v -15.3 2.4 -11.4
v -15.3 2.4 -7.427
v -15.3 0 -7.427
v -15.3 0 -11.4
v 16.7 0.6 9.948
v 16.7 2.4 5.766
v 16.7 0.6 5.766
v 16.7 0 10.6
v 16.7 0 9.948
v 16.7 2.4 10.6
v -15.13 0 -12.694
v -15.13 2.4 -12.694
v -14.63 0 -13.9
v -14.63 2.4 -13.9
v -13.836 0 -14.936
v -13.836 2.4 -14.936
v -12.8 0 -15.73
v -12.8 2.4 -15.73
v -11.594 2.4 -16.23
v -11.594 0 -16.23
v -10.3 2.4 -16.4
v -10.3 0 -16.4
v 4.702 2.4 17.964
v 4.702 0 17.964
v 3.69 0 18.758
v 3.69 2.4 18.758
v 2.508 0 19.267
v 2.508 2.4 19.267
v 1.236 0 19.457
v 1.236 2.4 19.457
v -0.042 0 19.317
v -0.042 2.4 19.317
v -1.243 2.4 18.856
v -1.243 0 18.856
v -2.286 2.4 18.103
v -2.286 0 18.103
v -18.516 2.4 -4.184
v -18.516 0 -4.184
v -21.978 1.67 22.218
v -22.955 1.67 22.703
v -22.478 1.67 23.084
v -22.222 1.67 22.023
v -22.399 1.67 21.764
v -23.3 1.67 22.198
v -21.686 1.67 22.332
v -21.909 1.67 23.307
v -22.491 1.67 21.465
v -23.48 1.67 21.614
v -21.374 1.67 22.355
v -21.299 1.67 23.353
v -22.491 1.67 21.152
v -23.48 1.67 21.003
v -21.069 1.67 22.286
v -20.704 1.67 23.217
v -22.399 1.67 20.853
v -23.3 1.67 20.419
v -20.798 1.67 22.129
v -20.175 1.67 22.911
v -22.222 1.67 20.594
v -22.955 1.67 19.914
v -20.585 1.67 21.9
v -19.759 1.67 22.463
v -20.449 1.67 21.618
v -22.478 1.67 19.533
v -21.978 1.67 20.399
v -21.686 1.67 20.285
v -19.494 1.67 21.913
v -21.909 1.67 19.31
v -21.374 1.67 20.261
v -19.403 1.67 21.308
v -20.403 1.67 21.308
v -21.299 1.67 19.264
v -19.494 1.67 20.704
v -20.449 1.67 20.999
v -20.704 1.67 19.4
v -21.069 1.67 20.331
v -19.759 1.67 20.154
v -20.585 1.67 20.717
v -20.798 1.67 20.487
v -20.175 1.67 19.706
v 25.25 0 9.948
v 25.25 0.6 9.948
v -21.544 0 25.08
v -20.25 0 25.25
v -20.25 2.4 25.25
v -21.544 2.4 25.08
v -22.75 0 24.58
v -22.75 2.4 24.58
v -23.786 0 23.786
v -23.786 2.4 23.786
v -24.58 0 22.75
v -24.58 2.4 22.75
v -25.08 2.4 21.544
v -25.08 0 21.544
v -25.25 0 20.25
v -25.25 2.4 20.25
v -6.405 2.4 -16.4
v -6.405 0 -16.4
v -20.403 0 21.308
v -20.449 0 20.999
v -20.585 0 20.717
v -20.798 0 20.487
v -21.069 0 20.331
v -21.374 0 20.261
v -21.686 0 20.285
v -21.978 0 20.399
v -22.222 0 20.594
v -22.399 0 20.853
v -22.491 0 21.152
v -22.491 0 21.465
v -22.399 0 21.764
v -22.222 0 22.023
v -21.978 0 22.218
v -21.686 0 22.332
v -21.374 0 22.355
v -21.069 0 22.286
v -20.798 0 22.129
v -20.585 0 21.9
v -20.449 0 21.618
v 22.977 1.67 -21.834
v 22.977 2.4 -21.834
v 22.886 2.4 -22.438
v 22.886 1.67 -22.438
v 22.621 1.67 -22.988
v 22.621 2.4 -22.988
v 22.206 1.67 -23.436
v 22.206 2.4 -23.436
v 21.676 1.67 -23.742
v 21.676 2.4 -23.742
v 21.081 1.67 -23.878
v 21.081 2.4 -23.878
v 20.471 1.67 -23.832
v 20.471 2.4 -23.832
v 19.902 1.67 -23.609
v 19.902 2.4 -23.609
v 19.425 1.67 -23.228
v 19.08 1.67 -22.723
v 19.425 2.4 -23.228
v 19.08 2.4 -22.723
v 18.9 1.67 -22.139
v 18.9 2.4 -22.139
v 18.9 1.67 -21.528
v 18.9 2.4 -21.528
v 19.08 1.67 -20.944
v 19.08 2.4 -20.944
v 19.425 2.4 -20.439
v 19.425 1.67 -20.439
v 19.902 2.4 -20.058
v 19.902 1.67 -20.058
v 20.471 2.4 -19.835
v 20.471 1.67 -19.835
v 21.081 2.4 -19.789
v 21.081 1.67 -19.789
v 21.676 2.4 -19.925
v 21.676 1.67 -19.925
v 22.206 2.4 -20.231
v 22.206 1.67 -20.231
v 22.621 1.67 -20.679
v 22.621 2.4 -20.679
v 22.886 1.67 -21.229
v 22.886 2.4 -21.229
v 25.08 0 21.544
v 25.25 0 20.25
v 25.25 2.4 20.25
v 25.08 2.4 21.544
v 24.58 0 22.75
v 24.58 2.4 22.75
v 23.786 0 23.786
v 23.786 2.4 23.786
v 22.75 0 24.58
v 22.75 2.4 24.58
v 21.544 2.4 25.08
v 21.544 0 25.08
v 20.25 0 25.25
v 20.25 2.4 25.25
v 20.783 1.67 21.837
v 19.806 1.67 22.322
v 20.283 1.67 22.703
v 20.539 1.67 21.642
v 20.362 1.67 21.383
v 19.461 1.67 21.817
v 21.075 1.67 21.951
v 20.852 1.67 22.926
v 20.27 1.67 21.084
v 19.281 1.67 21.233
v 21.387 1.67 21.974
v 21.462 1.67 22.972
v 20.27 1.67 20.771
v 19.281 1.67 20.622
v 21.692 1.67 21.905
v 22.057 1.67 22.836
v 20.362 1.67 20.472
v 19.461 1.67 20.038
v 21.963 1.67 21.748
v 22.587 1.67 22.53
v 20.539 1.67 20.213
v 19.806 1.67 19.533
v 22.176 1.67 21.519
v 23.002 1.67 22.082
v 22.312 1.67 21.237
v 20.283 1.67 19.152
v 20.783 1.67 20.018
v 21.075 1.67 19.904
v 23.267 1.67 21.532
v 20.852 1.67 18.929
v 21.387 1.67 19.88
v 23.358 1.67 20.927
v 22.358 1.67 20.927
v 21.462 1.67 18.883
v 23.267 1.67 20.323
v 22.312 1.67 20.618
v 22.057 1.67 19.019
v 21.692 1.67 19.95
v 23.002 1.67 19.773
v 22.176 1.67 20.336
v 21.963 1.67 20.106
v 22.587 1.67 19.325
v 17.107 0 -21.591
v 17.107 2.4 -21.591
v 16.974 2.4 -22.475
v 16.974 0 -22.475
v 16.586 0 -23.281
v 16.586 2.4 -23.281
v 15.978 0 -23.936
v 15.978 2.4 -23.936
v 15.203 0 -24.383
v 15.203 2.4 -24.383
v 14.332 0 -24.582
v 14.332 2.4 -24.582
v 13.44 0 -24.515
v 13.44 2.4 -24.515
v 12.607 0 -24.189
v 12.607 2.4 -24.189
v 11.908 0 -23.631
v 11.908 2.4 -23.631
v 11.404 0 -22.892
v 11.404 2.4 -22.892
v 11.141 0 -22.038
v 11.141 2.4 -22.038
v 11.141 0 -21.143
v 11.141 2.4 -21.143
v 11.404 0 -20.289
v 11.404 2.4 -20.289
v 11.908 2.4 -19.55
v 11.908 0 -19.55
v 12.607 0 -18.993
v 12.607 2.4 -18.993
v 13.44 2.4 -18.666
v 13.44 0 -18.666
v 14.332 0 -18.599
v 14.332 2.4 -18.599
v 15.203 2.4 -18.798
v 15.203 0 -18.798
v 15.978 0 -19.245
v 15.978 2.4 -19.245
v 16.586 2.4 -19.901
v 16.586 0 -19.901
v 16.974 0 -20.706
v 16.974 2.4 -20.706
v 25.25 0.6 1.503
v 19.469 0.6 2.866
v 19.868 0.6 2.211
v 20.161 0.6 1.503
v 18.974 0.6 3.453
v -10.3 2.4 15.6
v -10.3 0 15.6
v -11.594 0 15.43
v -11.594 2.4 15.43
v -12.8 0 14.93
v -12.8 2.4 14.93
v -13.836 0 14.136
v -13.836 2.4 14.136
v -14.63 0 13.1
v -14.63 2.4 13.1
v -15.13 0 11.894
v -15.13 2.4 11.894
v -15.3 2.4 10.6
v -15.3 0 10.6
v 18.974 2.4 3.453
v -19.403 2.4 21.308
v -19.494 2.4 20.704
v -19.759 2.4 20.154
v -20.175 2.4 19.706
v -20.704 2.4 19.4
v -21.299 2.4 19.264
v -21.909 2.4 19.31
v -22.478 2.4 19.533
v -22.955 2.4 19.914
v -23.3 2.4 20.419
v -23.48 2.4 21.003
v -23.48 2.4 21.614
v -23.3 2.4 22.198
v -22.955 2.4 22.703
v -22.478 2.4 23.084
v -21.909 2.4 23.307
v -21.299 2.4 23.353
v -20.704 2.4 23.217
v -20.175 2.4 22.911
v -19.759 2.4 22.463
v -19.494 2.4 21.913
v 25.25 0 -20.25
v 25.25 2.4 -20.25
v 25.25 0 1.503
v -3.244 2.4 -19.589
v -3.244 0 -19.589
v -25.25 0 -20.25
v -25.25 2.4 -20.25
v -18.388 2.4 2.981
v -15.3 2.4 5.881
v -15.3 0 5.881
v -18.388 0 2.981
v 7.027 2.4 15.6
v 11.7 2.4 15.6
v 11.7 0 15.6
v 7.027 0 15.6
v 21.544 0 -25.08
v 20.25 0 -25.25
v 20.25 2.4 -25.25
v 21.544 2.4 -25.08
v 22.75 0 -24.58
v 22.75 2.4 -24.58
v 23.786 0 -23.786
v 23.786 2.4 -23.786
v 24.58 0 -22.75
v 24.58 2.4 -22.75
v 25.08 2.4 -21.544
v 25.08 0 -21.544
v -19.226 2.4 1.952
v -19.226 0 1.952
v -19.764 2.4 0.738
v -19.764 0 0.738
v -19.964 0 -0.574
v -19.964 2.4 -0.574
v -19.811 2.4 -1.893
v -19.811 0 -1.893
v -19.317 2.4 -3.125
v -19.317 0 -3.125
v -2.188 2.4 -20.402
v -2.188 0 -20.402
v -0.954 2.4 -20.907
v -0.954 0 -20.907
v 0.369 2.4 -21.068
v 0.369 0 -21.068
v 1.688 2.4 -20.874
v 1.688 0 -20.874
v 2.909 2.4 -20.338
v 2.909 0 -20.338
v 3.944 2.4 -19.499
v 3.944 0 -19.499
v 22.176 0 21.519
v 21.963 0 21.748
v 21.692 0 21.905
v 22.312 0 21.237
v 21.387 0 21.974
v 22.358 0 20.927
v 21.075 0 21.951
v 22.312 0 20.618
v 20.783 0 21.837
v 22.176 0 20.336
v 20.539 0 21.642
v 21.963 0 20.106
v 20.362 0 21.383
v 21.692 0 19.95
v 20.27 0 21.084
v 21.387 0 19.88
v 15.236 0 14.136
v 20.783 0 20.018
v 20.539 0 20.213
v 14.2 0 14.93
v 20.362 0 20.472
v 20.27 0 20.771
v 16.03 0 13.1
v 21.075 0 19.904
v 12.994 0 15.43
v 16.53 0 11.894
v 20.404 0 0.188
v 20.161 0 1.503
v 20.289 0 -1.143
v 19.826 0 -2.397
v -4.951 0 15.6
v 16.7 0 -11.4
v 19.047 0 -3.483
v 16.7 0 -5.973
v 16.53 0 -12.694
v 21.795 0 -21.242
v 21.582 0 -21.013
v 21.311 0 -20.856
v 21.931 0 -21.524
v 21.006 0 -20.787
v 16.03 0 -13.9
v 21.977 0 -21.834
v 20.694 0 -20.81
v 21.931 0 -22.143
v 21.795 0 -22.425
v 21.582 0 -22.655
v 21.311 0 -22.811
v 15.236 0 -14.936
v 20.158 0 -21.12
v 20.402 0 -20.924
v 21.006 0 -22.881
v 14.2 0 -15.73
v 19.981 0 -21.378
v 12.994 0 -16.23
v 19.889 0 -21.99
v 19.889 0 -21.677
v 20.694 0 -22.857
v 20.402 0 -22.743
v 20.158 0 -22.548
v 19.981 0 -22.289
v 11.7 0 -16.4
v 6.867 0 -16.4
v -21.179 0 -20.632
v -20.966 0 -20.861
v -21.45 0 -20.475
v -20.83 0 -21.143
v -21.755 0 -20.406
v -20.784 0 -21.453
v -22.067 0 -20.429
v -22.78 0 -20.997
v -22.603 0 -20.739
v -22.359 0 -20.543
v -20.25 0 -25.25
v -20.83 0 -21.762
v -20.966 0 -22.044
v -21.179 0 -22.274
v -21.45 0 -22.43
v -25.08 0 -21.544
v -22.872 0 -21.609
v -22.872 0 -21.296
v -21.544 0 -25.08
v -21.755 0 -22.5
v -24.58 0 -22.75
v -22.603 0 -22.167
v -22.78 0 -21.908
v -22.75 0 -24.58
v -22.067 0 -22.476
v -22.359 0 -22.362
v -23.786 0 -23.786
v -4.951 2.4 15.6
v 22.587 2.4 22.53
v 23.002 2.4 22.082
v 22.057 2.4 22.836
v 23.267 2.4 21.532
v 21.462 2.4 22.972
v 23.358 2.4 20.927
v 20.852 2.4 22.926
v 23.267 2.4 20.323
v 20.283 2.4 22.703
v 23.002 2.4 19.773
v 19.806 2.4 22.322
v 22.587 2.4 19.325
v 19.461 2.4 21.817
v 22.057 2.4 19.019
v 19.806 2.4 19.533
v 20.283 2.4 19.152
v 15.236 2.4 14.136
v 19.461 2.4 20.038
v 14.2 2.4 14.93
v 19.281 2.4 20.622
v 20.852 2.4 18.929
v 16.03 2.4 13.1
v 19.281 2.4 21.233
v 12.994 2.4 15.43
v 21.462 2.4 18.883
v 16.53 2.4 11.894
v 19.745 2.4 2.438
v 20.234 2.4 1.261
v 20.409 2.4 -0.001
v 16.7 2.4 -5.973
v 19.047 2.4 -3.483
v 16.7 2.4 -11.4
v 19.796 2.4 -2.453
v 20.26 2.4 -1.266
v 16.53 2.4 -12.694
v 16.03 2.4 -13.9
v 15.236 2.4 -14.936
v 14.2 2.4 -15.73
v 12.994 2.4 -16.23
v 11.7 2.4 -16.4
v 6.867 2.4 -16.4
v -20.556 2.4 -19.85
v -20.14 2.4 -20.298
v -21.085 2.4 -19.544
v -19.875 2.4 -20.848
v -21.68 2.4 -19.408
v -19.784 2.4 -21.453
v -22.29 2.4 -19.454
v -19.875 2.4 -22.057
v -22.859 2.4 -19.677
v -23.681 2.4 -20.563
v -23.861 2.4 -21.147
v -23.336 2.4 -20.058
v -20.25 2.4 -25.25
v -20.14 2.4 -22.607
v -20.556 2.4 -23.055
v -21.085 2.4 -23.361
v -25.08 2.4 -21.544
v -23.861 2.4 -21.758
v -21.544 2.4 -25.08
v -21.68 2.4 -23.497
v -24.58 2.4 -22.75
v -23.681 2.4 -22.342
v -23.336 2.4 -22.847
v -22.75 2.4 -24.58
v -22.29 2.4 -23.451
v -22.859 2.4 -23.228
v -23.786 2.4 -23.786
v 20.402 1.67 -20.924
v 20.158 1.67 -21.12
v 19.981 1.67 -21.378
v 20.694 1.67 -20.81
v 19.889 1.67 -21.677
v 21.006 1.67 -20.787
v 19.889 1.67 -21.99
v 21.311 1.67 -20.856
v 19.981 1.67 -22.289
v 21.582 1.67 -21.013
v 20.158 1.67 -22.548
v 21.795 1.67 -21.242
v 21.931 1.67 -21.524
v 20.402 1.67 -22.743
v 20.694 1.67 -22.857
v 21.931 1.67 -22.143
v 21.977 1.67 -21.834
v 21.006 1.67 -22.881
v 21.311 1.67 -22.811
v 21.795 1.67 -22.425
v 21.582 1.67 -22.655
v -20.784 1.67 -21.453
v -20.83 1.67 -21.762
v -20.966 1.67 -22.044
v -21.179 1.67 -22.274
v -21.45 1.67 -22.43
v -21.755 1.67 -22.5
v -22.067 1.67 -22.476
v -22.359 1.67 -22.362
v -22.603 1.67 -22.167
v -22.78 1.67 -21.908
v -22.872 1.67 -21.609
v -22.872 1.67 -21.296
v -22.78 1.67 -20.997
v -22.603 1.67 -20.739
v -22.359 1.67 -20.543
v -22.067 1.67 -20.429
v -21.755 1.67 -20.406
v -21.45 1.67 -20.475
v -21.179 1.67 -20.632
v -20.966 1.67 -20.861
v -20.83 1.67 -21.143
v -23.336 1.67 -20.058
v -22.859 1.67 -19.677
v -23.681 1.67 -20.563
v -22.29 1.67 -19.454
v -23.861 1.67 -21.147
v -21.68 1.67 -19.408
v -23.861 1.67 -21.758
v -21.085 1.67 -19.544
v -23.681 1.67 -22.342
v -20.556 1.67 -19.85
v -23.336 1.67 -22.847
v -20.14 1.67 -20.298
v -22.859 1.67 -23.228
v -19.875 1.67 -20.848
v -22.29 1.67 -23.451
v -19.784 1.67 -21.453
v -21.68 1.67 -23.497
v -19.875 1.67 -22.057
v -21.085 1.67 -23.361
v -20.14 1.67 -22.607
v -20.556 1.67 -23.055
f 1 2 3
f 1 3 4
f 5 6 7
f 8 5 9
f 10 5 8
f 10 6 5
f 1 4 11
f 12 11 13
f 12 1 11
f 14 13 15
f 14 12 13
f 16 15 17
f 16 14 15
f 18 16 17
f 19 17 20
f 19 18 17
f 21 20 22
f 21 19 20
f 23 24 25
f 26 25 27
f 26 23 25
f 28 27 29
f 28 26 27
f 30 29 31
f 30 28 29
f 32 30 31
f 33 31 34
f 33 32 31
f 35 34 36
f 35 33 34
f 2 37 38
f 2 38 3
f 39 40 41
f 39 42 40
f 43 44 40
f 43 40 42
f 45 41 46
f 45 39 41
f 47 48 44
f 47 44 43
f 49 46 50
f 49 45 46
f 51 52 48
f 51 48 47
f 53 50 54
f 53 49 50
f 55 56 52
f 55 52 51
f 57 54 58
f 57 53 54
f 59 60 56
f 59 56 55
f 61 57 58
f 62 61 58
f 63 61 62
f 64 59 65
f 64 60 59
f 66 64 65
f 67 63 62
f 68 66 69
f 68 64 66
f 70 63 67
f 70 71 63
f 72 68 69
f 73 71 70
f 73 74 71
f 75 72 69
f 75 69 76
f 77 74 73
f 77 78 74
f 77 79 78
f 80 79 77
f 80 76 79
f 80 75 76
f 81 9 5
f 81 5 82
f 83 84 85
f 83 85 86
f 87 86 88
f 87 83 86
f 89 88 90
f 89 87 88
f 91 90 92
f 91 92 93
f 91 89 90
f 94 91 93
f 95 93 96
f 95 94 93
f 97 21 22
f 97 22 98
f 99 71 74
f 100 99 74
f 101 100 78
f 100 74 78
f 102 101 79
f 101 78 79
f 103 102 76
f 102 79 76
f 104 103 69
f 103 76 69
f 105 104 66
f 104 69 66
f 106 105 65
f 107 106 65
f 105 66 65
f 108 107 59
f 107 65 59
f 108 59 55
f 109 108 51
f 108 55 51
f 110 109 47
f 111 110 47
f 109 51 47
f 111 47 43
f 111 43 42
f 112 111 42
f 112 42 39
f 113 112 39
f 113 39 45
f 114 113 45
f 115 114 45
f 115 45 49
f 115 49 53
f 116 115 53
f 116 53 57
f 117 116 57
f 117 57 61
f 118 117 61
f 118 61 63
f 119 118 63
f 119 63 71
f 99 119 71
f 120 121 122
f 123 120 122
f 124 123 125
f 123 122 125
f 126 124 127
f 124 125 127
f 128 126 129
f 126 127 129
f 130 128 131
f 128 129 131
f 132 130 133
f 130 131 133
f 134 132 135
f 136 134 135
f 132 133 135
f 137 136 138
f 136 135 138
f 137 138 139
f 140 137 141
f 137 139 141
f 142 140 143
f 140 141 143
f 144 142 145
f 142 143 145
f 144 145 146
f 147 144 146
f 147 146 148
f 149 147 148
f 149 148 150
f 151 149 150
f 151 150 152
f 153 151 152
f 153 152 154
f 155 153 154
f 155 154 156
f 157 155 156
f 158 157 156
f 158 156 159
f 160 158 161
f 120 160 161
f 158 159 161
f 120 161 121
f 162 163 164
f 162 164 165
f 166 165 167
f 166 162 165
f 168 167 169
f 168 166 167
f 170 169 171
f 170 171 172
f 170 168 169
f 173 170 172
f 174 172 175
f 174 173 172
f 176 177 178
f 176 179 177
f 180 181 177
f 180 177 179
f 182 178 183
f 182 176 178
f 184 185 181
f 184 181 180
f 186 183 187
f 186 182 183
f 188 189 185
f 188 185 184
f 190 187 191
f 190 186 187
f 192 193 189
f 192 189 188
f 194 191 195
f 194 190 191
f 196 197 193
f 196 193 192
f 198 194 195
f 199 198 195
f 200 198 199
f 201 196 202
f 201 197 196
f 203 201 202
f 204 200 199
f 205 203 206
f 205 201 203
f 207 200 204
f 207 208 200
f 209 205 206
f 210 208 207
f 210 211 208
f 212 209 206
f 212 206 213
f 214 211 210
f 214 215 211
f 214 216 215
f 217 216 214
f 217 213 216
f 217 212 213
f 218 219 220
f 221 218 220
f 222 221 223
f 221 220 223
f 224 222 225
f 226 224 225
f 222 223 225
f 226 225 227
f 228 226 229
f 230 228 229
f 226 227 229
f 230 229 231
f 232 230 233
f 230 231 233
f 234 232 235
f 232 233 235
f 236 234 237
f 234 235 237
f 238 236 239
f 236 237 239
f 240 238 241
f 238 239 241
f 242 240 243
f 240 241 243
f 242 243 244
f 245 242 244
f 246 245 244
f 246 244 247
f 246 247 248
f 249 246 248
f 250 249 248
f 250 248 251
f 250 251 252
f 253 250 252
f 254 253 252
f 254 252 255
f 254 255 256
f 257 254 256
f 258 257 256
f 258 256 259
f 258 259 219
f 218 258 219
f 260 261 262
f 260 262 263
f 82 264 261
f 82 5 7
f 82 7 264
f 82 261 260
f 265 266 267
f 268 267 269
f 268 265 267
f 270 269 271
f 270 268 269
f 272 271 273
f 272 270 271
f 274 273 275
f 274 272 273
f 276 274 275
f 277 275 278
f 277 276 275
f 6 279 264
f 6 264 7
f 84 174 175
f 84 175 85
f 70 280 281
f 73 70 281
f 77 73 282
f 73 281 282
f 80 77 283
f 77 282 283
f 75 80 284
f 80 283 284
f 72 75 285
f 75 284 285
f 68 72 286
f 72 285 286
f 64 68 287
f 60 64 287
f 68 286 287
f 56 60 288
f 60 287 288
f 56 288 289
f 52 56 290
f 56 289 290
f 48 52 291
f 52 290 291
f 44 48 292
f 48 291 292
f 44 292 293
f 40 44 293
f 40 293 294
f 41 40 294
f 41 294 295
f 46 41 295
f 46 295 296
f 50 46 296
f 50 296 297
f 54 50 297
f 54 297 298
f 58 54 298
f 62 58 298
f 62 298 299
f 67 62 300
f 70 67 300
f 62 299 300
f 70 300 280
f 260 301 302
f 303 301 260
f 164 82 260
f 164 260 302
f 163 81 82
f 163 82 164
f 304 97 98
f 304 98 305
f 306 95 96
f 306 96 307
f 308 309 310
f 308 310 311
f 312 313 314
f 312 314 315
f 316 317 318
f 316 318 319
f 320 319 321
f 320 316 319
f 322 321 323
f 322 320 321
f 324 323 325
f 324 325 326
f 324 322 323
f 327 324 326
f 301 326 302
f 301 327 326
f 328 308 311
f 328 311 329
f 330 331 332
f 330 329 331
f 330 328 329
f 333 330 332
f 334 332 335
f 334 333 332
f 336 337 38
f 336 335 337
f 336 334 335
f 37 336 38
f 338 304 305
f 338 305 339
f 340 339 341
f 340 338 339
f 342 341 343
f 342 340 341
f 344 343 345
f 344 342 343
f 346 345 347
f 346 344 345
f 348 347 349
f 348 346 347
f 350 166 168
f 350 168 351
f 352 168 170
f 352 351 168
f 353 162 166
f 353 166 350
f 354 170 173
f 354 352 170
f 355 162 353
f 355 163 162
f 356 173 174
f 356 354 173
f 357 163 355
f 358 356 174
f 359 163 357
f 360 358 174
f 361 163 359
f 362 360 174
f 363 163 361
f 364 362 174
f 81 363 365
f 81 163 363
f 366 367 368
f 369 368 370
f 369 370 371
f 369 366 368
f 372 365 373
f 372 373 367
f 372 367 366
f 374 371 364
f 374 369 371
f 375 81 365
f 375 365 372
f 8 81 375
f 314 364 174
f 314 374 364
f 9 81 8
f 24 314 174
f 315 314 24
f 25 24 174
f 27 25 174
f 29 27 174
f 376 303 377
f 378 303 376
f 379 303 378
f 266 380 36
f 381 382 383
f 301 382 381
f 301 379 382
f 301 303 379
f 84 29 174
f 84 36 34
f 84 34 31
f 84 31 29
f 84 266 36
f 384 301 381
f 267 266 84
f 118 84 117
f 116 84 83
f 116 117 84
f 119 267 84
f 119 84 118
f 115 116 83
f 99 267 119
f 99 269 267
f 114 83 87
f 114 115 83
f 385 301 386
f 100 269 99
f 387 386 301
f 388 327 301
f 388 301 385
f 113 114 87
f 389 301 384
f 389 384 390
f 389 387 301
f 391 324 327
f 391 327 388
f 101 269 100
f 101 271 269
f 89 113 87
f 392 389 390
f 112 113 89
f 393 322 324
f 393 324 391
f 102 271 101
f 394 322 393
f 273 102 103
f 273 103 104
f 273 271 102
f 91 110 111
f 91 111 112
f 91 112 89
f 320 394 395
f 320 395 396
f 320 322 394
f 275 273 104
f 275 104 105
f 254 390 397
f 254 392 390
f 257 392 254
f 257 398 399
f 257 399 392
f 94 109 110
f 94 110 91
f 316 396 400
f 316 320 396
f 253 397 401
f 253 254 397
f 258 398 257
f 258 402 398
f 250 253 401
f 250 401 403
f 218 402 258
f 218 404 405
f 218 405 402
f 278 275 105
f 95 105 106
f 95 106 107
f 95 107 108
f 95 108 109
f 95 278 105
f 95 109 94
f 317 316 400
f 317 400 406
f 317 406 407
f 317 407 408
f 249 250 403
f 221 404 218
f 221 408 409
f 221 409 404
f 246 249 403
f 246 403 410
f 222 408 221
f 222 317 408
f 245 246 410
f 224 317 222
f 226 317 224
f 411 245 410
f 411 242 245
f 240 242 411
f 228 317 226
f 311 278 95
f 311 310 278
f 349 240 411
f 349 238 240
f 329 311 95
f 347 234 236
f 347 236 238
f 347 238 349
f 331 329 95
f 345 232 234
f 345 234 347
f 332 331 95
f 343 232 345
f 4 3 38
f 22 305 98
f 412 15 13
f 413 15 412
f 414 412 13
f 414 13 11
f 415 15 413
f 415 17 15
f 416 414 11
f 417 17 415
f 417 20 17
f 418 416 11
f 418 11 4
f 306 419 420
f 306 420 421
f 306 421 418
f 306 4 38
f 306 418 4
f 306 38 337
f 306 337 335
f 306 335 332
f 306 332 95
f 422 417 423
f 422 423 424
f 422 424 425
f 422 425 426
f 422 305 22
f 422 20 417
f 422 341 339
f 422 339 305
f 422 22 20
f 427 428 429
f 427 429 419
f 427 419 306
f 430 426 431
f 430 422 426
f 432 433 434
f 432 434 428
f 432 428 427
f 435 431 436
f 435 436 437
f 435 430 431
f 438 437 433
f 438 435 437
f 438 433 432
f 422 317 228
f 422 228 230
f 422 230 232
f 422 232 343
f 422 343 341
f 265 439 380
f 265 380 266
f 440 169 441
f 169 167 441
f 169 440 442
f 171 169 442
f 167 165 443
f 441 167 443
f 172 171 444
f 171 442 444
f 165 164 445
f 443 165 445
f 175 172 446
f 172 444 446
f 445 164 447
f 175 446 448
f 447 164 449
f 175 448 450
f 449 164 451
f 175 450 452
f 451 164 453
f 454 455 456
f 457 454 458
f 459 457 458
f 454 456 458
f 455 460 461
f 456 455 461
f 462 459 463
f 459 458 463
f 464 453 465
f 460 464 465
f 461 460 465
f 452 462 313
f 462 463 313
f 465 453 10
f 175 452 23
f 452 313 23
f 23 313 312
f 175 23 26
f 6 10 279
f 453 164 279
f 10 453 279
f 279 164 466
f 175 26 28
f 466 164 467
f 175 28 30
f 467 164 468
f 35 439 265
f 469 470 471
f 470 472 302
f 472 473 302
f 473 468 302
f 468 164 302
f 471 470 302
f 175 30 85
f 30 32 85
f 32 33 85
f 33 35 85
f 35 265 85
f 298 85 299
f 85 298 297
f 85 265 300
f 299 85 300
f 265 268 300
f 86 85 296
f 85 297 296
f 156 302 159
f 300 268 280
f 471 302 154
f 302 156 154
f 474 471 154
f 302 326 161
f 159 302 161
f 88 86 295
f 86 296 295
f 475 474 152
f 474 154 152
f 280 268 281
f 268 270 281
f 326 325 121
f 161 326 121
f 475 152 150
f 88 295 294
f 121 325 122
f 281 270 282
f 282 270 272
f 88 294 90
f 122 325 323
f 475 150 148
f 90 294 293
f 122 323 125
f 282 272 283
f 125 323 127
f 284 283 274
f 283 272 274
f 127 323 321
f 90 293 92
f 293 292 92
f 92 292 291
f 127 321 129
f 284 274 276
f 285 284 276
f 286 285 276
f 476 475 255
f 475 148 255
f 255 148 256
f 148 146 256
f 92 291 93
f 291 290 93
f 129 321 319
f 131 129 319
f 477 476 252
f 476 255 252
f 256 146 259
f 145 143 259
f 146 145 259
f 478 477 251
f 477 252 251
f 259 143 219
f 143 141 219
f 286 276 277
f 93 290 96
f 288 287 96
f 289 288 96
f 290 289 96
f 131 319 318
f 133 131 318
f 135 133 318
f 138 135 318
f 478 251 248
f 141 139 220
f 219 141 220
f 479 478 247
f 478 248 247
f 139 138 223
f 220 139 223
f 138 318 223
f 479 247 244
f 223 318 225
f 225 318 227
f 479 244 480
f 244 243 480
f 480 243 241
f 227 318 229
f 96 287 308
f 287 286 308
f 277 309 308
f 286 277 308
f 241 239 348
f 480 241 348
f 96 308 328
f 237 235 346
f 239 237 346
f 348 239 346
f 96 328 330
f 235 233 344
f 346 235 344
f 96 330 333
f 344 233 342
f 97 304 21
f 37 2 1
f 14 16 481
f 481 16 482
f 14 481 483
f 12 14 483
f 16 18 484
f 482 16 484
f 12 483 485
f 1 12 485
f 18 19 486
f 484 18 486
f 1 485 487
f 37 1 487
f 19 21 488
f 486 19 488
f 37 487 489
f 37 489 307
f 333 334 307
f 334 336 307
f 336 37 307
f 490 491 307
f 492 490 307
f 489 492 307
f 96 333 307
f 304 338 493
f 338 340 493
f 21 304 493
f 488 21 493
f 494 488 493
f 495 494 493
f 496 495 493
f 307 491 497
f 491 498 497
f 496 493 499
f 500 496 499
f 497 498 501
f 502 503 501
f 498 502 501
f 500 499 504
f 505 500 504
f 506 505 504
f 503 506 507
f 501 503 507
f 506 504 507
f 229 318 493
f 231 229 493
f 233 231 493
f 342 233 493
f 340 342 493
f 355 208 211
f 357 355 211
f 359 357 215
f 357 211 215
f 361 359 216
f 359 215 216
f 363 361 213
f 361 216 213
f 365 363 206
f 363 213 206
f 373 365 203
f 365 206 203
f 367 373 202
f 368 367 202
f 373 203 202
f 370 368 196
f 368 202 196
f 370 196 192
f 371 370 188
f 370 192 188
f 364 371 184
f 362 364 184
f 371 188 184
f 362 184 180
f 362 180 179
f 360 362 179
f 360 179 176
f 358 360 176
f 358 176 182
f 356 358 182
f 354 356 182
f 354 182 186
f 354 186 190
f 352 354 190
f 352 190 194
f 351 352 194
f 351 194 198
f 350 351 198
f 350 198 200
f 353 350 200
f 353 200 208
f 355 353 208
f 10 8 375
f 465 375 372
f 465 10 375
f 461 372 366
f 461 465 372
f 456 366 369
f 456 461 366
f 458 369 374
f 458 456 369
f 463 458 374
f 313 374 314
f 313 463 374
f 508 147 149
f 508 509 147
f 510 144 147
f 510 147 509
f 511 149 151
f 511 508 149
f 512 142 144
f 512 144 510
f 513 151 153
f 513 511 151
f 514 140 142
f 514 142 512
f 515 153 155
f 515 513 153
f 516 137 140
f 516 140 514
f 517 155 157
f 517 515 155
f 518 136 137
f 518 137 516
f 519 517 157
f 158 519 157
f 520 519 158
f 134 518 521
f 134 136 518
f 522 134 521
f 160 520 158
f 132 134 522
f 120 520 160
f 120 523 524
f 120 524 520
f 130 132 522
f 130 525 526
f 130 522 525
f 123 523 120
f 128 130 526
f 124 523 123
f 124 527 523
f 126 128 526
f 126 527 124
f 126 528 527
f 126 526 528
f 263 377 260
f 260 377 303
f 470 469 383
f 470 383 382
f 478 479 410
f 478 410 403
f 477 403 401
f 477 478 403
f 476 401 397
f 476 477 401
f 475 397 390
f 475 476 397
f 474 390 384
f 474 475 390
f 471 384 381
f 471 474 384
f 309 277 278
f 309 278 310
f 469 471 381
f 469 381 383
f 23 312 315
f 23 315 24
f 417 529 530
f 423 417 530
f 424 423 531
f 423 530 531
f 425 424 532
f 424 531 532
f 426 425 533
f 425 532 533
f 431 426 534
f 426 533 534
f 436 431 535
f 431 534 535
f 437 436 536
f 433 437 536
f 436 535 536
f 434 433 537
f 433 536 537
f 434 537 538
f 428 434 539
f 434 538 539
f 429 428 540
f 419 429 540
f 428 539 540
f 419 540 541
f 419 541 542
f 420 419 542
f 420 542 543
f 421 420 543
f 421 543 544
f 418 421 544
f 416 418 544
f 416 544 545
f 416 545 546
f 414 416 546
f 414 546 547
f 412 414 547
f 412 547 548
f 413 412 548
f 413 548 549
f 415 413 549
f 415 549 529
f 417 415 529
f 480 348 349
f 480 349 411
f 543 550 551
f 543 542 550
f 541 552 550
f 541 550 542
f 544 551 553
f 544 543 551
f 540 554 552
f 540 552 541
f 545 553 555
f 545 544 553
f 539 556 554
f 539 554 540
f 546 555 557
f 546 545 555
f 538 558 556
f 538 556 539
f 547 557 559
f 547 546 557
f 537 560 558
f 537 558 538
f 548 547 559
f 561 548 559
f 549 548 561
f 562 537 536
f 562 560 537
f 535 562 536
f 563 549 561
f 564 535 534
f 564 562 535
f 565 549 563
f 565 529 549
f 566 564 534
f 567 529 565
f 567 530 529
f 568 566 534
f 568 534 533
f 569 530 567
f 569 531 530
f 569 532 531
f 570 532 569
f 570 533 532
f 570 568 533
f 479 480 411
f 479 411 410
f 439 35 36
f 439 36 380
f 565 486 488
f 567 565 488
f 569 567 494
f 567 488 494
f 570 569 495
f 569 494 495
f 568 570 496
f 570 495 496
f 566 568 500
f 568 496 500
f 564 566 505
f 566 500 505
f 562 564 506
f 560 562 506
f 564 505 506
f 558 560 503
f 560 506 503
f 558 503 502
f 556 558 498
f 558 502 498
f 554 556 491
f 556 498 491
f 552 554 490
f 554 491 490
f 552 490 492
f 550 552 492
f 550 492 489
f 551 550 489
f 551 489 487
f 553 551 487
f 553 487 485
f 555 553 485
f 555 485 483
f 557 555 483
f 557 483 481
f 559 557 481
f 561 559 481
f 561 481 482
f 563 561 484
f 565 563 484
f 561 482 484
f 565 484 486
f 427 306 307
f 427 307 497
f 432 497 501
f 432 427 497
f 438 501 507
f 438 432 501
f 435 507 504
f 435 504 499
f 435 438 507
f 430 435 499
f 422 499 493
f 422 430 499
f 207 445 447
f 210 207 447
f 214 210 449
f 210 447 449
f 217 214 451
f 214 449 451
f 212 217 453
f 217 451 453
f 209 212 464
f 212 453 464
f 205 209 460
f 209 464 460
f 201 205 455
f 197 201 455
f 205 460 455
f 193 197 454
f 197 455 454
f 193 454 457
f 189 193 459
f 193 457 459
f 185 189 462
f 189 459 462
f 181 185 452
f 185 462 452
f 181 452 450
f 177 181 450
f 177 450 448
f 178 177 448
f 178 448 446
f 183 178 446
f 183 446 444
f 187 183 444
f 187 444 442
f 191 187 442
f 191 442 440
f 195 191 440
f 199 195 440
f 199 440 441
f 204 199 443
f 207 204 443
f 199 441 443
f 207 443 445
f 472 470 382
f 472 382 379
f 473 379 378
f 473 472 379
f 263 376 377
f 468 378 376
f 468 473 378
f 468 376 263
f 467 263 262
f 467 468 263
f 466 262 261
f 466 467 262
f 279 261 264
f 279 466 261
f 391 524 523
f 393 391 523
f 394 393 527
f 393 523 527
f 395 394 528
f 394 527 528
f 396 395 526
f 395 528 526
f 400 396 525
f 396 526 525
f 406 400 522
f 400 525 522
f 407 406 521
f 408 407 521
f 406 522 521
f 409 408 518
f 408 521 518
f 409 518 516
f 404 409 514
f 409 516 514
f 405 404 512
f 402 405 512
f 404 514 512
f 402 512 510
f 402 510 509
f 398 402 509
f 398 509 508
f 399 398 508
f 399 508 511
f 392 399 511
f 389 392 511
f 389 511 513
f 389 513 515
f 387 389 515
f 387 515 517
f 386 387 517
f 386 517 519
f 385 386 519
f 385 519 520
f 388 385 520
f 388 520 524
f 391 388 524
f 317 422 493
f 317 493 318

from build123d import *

# Parameters (mm, degrees)
EXTRUDE_1_DEPTH      = 2.4
SKETCH_2_R           = 1.05000254
CUT_EXTRUDE_1_DEPTH  = 10
CUT_EXTRUDE_8_DEPTH  = 3.4
SKETCH_4_R           = 2.05
CUT_EXTRUDE_9_DEPTH  = 0.73
SKETCH_5_R           = 3
CUT_EXTRUDE_10_DEPTH = 3.4
SKETCH_6_W           = 27.234219955
SKETCH_6_H           = 8.445318751
CUT_EXTRUDE_12_DEPTH = 0.6


with BuildPart() as part:
    # 草图1 → 凸台-拉伸1 (new body)
    with BuildSketch(Plane(origin=(0, 0, 0), x_dir=(1, 0, 0), z_dir=(0, 1, 0))):
        with BuildLine():
            Line((-20.25, 25.25), (20.25, 25.25))
            ThreePointArc((20.25, 25.25), (23.785533906, 23.785533906), (25.25, 20.25))
            Line((25.25, 20.25), (25.25, -20.25))
            ThreePointArc((25.25, -20.25), (23.785533906, -23.785533906), (20.25, -25.25))
            Line((20.25, -25.25), (-20.25, -25.25))
            ThreePointArc((-20.25, -25.25), (-23.785533906, -23.785533906), (-25.25, -20.25))
            Line((-25.25, -20.25), (-25.25, 20.25))
            ThreePointArc((-25.25, 20.25), (-23.785533906, 23.785533906), (-20.25, 25.25))
        make_face()
    extrude(amount=EXTRUDE_1_DEPTH)

    # 草图2 → 切除-拉伸1 (cut)
    with BuildSketch(Plane(origin=(0, 2.4, 0), x_dir=(1, 0, 0), z_dir=(0, 1, 0))):
        with Locations((21.308392177, -20.927391415)):
            Circle(SKETCH_2_R)
        with Locations((-21.452692405, -21.308392177)):
            Circle(SKETCH_2_R)
        with Locations((-21.833693167, 21.452692405)):
            Circle(SKETCH_2_R)
        with Locations((20.927391415, 21.833693167)):
            Circle(SKETCH_2_R)
    extrude(amount=-CUT_EXTRUDE_1_DEPTH, mode=Mode.SUBTRACT)

    # 草图3 → 切除-拉伸8 (cut, through all)
    with BuildSketch(Plane(origin=(0, 2.4, 0), x_dir=(1, 0, 0), z_dir=(0, 1, 0))):
        with BuildLine():
            Line((-18.515650574, 4.18369185), (-15.3, 7.427416998))
            Line((-15.3, 7.427416998), (-15.3, 11.4))
            ThreePointArc((-15.3, 11.4), (-13.835533906, 14.935533906), (-10.3, 16.4))
            Line((-10.3, 16.4), (-6.40507507, 16.4))
            Line((-6.40507507, 16.4), (-3.244074851, 19.588597663))
            ThreePointArc((-3.244074851, 19.588597663), (0.369210969, 21.068073973), (3.944434556, 19.49885096))
            Line((3.944434556, 19.49885096), (6.866728136, 16.4))
            Line((6.866728136, 16.4), (11.7, 16.4))
            ThreePointArc((11.7, 16.4), (15.235533906, 14.935533906), (16.7, 11.4))
            Line((16.7, 11.4), (16.7, 5.972627416))
            Line((16.7, 5.972627416), (19.047343924, 3.483463075))
            ThreePointArc((19.047343924, 3.483463075), (20.409425455, 0.000538557), (18.974455547, -3.452994511))
            Line((18.974455547, -3.452994511), (16.7, -5.765519402))
            Line((16.7, -5.765519402), (16.7, -10.6))
            ThreePointArc((16.7, -10.6), (15.235533906, -14.135533906), (11.7, -15.6))
            Line((11.7, -15.6), (7.027416998, -15.6))
            Line((7.027416998, -15.6), (4.702011711, -17.964327417))
            ThreePointArc((4.702011711, -17.964327417), (1.236457236, -19.457273038), (-2.285597178, -18.102988303))
            Line((-2.285597178, -18.102988303), (-4.950834187, -15.6))
            Line((-4.950834187, -15.6), (-10.3, -15.6))
            ThreePointArc((-10.3, -15.6), (-13.835533906, -14.135533906), (-15.3, -10.6))
            Line((-15.3, -10.6), (-15.3, -5.880848985))
            Line((-15.3, -5.880848985), (-18.387638433, -2.981173325))
            ThreePointArc((-18.387638433, -2.981173325), (-19.963985761, 0.57423879), (-18.515650574, 4.18369185))
        make_face()
    extrude(amount=-CUT_EXTRUDE_8_DEPTH, mode=Mode.SUBTRACT)

    # 草图4 → 切除-拉伸9 (cut)
    with BuildSketch(Plane(origin=(0, 2.4, 0), x_dir=(1, 0, 0), z_dir=(0, 1, 0))):
        with Locations((-21.833693167, 21.452692405)):
            Circle(SKETCH_4_R)
        with Locations((20.927391415, 21.833693167)):
            Circle(SKETCH_4_R)
        with Locations((21.308392177, -20.927391415)):
            Circle(SKETCH_4_R)
        with Locations((-21.452692405, -21.308392177)):
            Circle(SKETCH_4_R)
    extrude(amount=-CUT_EXTRUDE_9_DEPTH, mode=Mode.SUBTRACT)

    # 草图5 → 切除-拉伸10 (cut, through all)
    with BuildSketch(Plane(origin=(0, 2.4, 0), x_dir=(1, 0, 0), z_dir=(0, 1, 0))):
        with Locations((14.107378715, 21.590614681)):
            Circle(SKETCH_5_R)
    extrude(amount=-CUT_EXTRUDE_10_DEPTH, mode=Mode.SUBTRACT)

    # 草图6 → 切除-拉伸12 (cut)
    with BuildSketch(Plane.XZ):
        with Locations((26.071380204, 5.725361951)):
            Rectangle(SKETCH_6_W, SKETCH_6_H)
    extrude(amount=-CUT_EXTRUDE_12_DEPTH, mode=Mode.SUBTRACT)


solid = part.part
